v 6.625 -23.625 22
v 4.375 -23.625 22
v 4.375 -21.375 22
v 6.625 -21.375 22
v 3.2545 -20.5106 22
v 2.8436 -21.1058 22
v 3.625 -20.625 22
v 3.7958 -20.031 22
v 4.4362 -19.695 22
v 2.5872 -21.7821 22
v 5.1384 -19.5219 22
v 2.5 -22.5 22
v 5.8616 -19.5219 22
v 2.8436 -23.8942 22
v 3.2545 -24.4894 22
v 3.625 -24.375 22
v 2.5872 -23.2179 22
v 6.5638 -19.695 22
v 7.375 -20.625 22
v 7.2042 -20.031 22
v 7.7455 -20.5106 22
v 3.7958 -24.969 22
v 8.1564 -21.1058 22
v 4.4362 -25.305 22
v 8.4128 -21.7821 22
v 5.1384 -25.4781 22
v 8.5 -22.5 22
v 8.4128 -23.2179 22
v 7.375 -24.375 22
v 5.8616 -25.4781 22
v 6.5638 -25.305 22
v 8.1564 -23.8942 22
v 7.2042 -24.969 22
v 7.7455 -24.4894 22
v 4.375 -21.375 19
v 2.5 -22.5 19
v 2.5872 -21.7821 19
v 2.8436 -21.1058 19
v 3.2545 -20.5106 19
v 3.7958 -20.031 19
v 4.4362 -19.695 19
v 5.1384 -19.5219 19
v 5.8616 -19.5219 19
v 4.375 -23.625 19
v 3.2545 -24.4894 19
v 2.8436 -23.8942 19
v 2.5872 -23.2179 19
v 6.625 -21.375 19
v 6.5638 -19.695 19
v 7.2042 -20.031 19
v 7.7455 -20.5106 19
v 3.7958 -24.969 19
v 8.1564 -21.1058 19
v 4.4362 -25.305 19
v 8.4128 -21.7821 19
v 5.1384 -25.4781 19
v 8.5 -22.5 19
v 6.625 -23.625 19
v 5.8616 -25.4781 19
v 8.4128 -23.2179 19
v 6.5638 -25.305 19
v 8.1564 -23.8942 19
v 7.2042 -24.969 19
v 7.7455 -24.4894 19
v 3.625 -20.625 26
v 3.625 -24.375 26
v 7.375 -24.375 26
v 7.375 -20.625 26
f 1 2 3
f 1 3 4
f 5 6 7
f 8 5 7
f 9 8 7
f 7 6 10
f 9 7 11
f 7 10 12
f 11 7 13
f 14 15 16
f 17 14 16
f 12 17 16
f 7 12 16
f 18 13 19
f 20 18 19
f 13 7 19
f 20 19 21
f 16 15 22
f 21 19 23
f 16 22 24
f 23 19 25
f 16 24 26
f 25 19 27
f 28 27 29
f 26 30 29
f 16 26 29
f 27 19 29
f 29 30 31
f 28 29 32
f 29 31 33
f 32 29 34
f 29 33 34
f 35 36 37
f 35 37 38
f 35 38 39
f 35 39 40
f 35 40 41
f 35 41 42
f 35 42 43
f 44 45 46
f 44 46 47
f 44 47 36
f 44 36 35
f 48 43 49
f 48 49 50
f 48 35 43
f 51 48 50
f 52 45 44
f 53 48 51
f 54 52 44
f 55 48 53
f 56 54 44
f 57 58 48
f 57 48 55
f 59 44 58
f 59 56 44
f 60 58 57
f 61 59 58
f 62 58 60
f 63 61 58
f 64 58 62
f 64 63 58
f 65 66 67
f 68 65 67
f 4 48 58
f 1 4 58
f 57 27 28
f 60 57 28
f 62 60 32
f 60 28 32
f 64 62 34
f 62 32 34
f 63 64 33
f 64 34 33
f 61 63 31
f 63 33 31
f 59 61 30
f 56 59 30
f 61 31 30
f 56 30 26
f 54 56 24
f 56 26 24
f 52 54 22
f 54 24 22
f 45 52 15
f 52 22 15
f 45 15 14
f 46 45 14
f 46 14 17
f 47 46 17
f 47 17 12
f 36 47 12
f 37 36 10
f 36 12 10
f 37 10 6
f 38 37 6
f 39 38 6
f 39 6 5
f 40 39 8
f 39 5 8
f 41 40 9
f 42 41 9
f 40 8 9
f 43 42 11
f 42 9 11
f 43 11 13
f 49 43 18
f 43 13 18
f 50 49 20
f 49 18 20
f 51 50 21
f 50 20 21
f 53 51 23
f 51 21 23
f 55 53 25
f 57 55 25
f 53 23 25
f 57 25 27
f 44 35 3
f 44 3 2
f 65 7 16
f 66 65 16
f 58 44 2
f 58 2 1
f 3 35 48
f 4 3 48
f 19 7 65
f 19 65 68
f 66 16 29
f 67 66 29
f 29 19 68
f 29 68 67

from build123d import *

# Parameters (mm, degrees)
SKETCH079_W     = 3.75
SKETCH079_H     = 3.75
PAD046_DEPTH    = 4
SKETCH080_R     = 3
PAD047_DEPTH    = 3
SKETCH081_W     = 2.25
SKETCH081_H     = 2.25
POCKET034_DEPTH = 3


with BuildPart() as part:
    # Sketch079 → Pad046 (new body)
    with BuildSketch(Plane(origin=(0, 0, 22), x_dir=(1, 0, 0), z_dir=(0, 0, -1))):
        with Locations((5.5, 22.5)):
            Rectangle(SKETCH079_W, SKETCH079_H)
    extrude(amount=-PAD046_DEPTH)

    # Sketch080 (on Face5 of Pad046) → Pad047 (join)
    with BuildSketch(Plane(origin=(0, 0, 22), x_dir=(1, 0, 0), z_dir=(0, 0, -1))):
        with Locations((5.5, 22.5)):
            Circle(SKETCH080_R)
    extrude(amount=PAD047_DEPTH)

    # Sketch081 (on Face3 of Pad047) → Pocket034 (cut)
    with BuildSketch(Plane(origin=(0, 0, 19), x_dir=(1, 0, 0), z_dir=(0, 0, -1))):
        with Locations((5.5, 22.5)):
            Rectangle(SKETCH081_W, SKETCH081_H)
    extrude(amount=-POCKET034_DEPTH, mode=Mode.SUBTRACT)


solid = part.part
